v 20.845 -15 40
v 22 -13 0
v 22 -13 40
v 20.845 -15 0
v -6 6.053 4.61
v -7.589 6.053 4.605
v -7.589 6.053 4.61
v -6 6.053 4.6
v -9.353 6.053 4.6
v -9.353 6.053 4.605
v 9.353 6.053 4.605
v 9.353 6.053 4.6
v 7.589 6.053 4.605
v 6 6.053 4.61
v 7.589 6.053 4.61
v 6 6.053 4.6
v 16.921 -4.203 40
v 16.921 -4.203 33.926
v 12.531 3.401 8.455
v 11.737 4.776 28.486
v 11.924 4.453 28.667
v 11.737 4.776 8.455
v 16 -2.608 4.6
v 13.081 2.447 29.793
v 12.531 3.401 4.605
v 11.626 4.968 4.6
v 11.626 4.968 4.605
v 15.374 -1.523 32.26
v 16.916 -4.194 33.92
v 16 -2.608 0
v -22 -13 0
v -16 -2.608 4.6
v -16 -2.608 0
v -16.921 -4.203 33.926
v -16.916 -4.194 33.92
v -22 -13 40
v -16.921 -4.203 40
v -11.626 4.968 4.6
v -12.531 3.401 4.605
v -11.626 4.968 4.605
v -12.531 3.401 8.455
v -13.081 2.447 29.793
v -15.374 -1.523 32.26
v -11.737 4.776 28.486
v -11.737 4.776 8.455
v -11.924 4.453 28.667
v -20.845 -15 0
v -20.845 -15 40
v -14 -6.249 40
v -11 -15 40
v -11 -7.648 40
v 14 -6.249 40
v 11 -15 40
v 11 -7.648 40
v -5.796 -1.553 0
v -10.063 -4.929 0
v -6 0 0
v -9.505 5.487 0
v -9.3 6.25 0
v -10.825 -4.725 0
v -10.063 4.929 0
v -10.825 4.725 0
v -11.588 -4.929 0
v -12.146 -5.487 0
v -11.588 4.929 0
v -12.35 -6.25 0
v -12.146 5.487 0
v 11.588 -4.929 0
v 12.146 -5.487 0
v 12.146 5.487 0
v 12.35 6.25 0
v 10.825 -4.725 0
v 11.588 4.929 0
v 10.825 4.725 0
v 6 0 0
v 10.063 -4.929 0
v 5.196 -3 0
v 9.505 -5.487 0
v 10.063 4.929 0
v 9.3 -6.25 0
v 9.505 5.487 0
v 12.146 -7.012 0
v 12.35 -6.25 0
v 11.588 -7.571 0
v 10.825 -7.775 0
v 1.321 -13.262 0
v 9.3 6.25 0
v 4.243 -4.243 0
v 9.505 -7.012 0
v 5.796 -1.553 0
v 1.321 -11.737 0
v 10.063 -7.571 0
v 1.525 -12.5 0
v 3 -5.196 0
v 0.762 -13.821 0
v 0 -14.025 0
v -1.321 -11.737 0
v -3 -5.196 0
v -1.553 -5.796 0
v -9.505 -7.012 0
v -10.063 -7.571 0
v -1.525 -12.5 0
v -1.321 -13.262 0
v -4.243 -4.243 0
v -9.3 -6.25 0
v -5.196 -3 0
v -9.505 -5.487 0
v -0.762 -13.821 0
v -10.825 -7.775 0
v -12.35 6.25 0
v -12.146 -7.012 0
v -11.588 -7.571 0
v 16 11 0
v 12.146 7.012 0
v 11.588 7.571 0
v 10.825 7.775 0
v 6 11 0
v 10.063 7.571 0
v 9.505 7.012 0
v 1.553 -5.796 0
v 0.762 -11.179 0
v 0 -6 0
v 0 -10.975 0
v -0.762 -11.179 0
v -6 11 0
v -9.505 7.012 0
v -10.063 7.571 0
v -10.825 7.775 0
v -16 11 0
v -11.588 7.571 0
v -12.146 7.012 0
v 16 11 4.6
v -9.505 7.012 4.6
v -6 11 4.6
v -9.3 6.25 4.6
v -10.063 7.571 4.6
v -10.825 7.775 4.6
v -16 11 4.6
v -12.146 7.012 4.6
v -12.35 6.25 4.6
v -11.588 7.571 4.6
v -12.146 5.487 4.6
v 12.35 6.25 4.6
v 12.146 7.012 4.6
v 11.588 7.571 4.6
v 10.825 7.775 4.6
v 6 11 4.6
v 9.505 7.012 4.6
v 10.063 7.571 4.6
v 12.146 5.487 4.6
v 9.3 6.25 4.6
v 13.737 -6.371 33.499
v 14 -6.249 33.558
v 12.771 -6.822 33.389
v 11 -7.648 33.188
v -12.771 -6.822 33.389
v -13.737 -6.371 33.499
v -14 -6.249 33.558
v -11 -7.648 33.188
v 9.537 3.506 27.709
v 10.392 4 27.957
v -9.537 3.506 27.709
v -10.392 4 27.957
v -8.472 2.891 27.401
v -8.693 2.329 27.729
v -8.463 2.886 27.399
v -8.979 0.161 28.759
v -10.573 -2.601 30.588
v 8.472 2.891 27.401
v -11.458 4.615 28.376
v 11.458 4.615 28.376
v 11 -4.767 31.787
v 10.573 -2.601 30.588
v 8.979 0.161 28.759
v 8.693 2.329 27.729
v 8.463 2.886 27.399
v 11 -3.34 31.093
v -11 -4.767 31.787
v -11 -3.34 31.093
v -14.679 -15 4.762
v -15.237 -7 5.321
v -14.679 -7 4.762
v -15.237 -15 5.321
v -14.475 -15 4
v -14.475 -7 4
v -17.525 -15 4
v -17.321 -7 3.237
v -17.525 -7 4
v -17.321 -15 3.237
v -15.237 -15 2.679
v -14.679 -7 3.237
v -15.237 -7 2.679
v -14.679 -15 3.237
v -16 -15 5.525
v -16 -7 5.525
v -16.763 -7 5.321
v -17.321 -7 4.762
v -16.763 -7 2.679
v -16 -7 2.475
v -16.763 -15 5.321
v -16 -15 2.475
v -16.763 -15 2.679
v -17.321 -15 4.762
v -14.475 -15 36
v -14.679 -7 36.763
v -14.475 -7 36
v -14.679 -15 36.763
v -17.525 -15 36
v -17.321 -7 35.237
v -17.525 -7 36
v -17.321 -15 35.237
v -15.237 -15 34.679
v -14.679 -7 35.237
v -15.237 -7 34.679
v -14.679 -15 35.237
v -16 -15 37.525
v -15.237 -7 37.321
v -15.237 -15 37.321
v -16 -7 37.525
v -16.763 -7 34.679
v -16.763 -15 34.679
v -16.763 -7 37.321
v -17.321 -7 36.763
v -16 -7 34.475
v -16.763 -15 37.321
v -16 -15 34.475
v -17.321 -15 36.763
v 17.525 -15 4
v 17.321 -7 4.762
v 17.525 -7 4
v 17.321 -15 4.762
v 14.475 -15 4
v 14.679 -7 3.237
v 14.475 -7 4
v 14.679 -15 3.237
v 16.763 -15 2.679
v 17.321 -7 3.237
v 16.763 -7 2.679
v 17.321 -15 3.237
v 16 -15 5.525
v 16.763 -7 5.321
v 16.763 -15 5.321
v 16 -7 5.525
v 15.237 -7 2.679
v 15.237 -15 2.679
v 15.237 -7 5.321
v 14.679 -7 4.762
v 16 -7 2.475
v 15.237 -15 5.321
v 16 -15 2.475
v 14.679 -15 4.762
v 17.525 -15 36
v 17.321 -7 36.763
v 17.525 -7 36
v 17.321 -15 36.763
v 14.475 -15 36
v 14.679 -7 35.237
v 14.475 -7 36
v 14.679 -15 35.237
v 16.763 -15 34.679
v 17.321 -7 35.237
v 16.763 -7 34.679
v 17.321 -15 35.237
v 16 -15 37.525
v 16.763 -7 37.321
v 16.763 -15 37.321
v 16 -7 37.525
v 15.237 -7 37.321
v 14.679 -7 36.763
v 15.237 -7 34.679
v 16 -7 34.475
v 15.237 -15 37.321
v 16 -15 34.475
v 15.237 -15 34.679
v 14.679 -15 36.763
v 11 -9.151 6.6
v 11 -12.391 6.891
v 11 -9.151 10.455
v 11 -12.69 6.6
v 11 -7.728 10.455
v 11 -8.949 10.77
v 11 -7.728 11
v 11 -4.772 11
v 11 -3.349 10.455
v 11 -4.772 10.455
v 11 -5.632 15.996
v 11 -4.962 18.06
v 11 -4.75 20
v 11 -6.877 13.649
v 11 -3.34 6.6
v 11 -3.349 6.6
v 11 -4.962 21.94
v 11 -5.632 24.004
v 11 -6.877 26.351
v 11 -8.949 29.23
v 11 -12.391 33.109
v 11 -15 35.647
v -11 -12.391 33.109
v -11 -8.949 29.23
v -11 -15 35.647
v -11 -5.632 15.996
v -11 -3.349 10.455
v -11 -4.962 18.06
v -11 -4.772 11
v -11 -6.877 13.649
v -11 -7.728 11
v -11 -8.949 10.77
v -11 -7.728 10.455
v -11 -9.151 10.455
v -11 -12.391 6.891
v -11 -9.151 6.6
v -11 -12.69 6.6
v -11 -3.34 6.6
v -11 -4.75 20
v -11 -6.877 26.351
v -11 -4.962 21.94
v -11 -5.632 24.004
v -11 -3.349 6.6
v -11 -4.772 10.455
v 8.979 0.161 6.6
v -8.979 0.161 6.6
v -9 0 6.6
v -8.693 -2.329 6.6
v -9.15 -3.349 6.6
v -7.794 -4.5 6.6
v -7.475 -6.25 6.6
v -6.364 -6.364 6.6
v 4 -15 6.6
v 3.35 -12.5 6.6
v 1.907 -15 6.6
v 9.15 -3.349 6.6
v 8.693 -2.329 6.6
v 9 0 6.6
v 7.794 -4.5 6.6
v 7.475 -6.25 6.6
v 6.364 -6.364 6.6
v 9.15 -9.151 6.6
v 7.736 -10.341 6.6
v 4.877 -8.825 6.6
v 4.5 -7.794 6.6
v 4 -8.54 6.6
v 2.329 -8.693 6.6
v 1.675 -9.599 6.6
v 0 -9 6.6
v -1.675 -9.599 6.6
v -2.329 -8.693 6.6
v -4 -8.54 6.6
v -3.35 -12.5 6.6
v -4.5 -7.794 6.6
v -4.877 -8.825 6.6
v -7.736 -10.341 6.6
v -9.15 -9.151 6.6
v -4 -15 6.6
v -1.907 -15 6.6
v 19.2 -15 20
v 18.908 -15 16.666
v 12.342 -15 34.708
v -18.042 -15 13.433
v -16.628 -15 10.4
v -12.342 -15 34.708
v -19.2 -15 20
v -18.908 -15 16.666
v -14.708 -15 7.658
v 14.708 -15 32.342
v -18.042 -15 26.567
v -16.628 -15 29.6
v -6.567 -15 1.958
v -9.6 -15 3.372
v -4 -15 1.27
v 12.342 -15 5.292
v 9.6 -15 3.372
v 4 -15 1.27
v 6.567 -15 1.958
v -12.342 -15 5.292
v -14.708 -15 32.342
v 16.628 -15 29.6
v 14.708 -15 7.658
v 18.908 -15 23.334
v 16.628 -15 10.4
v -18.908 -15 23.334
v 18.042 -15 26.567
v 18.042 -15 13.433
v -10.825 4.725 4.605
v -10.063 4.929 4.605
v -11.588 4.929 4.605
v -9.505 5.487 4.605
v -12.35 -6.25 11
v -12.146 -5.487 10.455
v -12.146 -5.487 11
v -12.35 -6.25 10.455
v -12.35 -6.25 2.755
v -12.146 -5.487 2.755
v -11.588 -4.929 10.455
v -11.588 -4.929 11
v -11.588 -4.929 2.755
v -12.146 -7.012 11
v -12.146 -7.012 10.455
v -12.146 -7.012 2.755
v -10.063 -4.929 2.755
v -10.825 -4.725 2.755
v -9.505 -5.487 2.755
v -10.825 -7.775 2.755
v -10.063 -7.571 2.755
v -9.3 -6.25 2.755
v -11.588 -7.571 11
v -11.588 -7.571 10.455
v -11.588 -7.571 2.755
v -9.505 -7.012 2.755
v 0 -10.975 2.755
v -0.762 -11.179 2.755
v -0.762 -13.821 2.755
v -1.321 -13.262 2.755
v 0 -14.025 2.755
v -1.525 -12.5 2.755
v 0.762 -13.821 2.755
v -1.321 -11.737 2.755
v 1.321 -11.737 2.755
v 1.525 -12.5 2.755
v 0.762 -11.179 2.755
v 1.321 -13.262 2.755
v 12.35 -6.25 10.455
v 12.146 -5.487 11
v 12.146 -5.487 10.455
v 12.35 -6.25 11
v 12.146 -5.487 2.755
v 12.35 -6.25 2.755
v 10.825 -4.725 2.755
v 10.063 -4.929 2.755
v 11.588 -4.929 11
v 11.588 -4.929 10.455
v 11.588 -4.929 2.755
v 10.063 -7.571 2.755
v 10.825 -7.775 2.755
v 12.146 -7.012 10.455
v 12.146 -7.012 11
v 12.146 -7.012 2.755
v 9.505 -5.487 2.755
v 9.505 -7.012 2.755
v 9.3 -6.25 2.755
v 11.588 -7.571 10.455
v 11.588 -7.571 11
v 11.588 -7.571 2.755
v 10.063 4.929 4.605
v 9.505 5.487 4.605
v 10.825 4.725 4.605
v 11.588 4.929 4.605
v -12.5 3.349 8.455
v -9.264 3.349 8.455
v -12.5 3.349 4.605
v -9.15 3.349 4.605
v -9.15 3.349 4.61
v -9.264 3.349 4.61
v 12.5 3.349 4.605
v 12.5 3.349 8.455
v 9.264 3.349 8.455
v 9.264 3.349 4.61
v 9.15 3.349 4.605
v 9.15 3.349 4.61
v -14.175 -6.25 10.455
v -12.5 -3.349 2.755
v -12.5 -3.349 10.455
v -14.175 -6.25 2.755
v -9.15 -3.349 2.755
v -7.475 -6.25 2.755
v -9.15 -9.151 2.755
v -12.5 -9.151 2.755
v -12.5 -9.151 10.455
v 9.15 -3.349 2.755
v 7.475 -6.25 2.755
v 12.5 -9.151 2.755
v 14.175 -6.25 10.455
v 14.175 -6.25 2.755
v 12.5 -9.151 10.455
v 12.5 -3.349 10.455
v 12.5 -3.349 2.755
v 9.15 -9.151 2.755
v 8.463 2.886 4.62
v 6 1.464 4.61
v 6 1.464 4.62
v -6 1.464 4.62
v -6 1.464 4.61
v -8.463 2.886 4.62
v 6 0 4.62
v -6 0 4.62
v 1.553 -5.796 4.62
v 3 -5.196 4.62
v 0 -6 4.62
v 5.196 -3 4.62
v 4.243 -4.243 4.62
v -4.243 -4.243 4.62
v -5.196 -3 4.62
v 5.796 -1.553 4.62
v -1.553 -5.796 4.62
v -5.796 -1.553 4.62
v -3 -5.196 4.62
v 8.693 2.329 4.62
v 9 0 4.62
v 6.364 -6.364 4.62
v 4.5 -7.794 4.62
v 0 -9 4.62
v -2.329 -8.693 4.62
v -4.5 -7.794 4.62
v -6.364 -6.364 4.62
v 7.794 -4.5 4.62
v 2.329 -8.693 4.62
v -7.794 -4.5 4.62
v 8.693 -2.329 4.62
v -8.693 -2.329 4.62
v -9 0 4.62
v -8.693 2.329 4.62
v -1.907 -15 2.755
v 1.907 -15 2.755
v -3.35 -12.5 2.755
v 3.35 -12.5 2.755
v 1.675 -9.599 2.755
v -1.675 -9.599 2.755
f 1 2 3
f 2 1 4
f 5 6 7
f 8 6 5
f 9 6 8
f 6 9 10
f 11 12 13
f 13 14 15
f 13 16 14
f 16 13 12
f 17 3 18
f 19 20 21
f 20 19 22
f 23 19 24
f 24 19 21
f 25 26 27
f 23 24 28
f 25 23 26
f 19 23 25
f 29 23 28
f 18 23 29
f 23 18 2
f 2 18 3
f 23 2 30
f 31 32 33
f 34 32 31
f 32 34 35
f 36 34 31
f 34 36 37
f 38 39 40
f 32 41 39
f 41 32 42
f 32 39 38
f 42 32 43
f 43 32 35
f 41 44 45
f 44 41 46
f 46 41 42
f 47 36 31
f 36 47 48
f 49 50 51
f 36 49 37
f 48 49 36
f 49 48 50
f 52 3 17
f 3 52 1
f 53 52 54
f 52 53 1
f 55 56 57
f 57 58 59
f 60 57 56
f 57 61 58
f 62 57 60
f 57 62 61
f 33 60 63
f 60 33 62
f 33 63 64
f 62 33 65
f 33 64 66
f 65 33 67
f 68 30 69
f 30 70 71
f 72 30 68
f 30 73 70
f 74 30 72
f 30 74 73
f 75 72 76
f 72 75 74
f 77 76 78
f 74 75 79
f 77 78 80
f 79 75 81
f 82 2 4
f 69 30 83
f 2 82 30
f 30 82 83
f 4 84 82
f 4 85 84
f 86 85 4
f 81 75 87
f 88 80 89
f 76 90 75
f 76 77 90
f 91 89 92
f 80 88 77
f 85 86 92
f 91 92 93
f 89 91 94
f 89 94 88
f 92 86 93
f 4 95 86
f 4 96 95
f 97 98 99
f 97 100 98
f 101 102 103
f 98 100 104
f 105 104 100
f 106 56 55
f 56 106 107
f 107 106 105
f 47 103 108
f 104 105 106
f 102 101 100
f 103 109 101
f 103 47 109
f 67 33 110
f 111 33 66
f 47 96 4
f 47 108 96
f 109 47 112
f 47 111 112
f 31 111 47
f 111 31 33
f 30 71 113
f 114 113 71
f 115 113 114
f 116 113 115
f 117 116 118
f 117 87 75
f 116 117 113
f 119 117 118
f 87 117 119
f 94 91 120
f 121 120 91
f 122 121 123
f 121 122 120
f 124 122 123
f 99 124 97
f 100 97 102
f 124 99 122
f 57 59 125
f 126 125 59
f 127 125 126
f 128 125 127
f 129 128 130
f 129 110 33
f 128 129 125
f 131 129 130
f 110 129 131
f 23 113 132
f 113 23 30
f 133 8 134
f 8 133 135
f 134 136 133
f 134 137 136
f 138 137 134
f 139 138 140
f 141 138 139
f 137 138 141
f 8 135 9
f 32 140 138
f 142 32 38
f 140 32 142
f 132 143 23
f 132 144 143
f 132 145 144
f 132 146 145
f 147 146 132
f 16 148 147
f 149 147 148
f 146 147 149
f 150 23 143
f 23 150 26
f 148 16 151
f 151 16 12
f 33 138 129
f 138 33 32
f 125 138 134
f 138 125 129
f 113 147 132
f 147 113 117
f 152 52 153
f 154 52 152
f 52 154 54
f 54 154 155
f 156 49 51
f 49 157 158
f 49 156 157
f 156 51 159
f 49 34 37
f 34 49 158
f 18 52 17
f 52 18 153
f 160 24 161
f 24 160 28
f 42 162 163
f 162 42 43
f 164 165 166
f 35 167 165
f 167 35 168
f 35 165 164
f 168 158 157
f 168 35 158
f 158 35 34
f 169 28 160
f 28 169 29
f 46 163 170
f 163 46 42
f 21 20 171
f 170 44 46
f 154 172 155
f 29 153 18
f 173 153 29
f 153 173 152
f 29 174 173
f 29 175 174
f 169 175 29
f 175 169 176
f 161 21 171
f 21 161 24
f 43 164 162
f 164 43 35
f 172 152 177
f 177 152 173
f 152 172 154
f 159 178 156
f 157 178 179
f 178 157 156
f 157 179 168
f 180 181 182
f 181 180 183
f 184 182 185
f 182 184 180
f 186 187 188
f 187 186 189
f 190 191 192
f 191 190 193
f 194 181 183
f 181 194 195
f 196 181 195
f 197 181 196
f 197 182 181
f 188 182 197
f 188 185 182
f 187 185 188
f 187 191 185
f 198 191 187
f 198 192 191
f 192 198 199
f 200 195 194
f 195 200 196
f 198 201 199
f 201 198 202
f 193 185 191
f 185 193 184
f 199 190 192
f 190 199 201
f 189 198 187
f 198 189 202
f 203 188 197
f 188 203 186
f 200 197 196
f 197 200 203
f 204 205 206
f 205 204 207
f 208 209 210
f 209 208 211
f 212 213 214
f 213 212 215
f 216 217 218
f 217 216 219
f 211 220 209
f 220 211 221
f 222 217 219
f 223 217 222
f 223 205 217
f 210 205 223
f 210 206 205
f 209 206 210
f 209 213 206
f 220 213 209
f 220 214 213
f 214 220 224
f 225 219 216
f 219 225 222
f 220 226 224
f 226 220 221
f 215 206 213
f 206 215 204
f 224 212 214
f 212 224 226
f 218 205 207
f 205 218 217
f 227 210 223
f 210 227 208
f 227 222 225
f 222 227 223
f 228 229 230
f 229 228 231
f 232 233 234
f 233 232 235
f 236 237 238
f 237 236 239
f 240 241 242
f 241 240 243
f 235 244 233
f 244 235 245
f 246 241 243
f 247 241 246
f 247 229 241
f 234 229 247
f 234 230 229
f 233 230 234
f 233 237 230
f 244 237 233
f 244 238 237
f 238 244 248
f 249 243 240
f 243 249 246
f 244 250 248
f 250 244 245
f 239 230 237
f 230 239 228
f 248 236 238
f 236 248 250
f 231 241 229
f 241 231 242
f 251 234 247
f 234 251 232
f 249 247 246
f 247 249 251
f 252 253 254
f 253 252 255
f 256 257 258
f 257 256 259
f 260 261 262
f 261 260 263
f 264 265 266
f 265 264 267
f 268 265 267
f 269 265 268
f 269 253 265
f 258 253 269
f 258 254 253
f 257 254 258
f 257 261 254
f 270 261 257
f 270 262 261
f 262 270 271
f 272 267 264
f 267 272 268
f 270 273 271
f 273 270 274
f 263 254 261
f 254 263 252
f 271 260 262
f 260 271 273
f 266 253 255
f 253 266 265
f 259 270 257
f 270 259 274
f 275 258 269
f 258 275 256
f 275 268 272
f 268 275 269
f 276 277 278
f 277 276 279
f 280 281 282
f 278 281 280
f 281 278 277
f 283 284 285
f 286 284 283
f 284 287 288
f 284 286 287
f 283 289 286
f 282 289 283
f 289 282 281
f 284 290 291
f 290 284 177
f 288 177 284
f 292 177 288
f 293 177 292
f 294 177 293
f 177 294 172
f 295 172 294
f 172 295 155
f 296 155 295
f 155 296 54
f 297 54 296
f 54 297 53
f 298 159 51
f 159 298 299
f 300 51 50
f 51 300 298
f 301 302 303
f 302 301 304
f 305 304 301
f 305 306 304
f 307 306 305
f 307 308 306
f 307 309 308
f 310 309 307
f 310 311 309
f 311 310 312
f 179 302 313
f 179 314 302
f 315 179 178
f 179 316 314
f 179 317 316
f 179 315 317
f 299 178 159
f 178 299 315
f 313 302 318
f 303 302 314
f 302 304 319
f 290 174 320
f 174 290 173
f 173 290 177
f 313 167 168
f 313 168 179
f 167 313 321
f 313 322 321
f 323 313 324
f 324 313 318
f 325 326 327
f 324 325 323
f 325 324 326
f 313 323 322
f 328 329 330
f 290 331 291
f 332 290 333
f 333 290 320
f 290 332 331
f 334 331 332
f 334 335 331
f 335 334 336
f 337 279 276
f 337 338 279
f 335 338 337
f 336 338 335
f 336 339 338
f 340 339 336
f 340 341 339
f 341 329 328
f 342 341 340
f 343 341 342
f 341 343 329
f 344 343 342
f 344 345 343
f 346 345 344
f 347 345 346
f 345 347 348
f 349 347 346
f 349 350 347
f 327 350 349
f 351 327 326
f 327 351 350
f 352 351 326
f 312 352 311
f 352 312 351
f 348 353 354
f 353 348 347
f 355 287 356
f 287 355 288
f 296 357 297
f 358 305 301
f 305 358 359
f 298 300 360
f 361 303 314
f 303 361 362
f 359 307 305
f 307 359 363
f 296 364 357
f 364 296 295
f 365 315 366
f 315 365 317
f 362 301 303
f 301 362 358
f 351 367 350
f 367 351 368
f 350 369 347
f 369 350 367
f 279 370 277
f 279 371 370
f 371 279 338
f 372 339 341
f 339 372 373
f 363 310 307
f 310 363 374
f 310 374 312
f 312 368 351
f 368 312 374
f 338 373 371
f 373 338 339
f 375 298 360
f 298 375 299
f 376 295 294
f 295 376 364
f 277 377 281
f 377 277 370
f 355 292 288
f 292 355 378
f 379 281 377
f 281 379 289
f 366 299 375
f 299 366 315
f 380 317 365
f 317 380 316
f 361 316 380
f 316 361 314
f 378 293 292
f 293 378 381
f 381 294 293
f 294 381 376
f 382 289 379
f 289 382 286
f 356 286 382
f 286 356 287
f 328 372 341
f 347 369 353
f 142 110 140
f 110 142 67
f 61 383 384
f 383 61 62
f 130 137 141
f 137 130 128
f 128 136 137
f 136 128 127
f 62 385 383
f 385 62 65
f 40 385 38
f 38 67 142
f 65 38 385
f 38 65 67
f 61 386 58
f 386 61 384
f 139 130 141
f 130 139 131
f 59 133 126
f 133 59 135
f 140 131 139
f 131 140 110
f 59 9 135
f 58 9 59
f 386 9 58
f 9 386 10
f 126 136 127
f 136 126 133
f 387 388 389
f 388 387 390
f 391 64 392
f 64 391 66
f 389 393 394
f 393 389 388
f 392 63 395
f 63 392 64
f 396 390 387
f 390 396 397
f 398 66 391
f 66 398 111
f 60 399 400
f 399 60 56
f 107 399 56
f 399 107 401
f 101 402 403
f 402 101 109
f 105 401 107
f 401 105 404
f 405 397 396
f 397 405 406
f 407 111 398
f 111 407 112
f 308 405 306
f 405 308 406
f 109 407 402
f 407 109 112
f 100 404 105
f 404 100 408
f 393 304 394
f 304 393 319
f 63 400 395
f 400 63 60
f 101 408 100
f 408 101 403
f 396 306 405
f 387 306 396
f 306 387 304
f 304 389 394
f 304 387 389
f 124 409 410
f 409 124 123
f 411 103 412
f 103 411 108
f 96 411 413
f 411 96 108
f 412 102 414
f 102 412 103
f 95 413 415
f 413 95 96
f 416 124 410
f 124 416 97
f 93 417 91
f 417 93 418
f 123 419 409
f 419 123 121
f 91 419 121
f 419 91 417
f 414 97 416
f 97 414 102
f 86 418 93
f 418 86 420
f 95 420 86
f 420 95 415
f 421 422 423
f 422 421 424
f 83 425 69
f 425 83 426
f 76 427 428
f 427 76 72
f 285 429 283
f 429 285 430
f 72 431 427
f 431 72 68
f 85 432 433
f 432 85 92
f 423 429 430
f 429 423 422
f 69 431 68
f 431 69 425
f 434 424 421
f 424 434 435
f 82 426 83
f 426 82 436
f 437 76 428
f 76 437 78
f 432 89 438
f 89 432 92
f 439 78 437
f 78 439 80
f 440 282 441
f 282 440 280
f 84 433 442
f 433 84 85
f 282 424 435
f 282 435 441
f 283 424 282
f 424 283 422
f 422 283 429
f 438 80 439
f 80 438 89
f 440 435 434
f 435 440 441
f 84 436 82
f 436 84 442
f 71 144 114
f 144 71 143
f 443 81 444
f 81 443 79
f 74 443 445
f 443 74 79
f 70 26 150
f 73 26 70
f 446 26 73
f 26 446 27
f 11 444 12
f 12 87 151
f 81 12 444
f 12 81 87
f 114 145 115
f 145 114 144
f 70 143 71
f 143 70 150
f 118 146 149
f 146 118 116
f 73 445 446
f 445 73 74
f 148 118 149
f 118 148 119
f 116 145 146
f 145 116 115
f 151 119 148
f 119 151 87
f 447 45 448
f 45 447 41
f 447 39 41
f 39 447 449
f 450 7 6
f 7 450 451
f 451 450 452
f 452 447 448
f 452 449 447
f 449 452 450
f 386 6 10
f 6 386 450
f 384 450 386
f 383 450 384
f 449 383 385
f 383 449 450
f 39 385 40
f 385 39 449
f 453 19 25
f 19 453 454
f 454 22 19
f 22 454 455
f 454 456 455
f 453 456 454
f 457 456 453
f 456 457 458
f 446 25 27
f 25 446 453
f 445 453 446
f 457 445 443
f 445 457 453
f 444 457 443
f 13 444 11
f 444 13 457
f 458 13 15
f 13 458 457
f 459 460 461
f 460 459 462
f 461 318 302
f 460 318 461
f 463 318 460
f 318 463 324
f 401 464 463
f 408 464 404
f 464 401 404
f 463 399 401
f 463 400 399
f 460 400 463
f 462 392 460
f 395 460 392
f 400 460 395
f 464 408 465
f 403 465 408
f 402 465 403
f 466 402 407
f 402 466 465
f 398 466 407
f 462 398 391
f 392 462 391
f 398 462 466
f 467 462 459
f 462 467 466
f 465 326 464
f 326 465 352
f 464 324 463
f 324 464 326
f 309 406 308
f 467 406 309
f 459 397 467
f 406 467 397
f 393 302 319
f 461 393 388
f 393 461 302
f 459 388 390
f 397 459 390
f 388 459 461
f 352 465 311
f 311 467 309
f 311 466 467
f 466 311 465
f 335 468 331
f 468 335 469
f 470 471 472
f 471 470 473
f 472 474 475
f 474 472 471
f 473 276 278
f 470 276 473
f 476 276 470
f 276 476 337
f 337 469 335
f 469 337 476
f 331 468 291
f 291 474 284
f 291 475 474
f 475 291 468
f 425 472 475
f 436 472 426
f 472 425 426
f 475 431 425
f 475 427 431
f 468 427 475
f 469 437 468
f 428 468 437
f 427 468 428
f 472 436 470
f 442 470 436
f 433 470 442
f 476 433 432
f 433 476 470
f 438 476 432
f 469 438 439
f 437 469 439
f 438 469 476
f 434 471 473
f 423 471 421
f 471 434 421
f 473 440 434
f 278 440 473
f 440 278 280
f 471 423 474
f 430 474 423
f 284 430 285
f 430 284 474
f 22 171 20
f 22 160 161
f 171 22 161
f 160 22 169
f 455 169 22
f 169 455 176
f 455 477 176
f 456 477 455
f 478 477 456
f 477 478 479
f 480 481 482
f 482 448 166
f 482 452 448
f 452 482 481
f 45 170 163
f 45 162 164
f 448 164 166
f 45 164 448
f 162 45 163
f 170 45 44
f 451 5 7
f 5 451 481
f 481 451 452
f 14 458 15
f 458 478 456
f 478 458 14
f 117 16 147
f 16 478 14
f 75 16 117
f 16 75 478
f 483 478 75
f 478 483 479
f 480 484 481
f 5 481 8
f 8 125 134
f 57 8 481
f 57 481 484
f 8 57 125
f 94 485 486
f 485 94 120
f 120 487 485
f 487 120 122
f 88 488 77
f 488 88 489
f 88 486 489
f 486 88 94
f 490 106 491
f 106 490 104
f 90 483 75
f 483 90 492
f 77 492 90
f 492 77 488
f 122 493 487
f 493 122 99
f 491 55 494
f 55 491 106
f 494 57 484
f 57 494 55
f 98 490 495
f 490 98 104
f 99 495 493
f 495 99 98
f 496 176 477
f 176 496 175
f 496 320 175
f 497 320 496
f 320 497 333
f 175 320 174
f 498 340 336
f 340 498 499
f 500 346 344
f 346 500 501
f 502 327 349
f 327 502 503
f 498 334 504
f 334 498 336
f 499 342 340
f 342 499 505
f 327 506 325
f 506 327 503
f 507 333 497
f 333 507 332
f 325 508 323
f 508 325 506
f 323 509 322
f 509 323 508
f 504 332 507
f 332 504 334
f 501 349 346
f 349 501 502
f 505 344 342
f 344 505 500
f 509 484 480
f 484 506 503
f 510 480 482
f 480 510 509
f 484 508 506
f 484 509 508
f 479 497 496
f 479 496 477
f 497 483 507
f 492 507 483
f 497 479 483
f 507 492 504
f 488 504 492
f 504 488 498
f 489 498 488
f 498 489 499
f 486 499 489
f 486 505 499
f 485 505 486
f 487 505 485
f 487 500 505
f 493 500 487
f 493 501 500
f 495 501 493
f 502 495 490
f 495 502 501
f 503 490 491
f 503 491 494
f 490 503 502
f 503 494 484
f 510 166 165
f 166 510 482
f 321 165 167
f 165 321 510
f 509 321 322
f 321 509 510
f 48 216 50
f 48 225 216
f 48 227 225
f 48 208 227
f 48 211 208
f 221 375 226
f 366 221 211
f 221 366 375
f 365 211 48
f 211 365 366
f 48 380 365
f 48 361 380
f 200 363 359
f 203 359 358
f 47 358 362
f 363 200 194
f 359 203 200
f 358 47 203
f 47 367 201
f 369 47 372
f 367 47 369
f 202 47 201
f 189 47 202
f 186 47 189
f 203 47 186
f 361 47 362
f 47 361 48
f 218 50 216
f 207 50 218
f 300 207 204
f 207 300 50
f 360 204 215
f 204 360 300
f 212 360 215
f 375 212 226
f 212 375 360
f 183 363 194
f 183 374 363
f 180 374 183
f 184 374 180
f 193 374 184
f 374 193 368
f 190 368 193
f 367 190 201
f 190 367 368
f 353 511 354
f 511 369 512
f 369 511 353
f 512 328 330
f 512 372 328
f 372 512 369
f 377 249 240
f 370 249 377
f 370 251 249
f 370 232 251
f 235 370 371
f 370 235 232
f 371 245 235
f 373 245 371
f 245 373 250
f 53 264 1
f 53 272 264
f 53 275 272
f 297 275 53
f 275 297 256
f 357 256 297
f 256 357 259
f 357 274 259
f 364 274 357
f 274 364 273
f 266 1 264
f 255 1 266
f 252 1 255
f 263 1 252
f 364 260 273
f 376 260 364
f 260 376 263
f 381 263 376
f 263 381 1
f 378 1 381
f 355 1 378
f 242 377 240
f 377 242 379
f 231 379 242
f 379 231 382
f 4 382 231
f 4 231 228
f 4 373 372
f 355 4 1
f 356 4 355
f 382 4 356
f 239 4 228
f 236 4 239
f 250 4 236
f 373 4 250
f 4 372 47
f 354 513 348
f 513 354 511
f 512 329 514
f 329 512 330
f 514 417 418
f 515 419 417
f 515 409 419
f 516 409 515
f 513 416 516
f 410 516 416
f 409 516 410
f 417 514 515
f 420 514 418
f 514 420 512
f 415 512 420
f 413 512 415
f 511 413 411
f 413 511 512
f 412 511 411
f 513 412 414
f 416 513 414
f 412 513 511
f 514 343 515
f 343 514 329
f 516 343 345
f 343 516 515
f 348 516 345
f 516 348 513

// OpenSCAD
// file: configuration.scad
// Increase this if your slicer or printer make holes too tight.
extra_radius = 0.1;

// OD = outside diameter, corner to corner.
m3_nut_od = 6.1;
m3_nut_radius = m3_nut_od/2 + 0.2 + extra_radius;
m3_washer_radius = 3.5 + extra_radius;
m3_nut_thickness = 2.35;
m3_nyloc_thickness = 3.85;

// Major diameter of metric 3mm thread.
m3_major = 2.85;
m3_radius = m3_major/2 + extra_radius;
m3_wide_radius = m3_major/2 + extra_radius + 0.2;

// NEMA17 stepper motors.
motor_shaft_diameter = 5;
motor_shaft_radius = motor_shaft_diameter/2 + extra_radius;

// Frame brackets. M3x8mm screws work best with 3.6 mm brackets.
thickness = 3.6;

// OpenBeam or Misumi. Currently only 15x15 mm, but there is a plan
// to make models more parametric and allow 20x20 mm in the future.
extrusion = 15;

// Placement for the NEMA17 stepper motors.
motor_offset = 44;
motor_length = 47;
// main file
include <configuration.scad>;

barrel_radius = 8;
barrel_height = 30;

groove_radius = 6;
groove_height = 4.6;

fan_offset = 15;

module hotend_fan() {
  difference() {
    union() {
      translate([0, 2 - fan_offset, 0])
        cylinder(r=22, h=40, $fn=6);
      translate([0, 0, groove_height/2])
        cube([32, 22, groove_height], center=true);
    }
    // Opposite side cutaway (outgoing airflow).
    translate([0, 38, groove_height + 0.01]) rotate([0, 0, 30])
      cylinder(r=40, h=200, $fn=6);
    // Groove mount insert slot.
    translate([0, 10, 0])
      cube([2*groove_radius, 20, 20], center=true);
    // Keep printed plastic away from the hotend.
    intersection() {
      translate([0, 18, 0]) rotate([0, 0, 30])
        cylinder(r=28, h=100, center=true, $fn=36);
      translate([0, 10, barrel_height-5])
        cylinder(r1=barrel_radius-1, r2=100, h=55, $fn=36);
    }
    // Groove mount.
    cylinder(r=groove_radius, h=200, center=true, $fn=24);
    // J-Head barrel.
    translate([0, 0, groove_height + 0.02])
      cylinder(r=barrel_radius + 1, h=100, $fn=24);
    // Fan mounting surface and screws.
    translate([0, -50 - fan_offset, 0])
      cube([100, 100, 100], center=true);
    for (x = [-16, 16]) {
      for (z = [-16, 16]) {
        translate([x, -fan_offset, z+20]) rotate([90, 0, 0]) #
          cylinder(r=m3_radius, h=16, center=true, $fn=12);
      }
    }
    // Vertical inner space.
    intersection() {
      cube([22, 100, 100], center=true);
      translate([0, -12, groove_height + 2])
        cylinder(r=16, h=40, $fn=6);
    }
    // Air funnel.
    difference() {
      translate([0, -1 - fan_offset, 20]) rotate([-90, 0, 0])
        cylinder(r1=20, r2=0, h=25, $fn=36);
      cube([8, 40, 40], center=true);
    }
    for (a = [60:60:359]) {
      rotate([0, 0, a]) translate([0, 12.5, 5]) { #
        cylinder(r=m3_radius, h=12, center=true, $fn=12);
      }
    }
    for (a = [60, 300]) {
      rotate([0, 0, a]) translate([0, 12.5, 6.53])
        # cylinder(r=m3_nut_radius, h=m3_nyloc_thickness, center = true, $fn=6);
    }
    for (a = [120, 240]) {
      rotate([0, 0, a]) translate([0, 12.5, 8.53-m3_nyloc_thickness/2])
        # cylinder(r=m3_nut_radius, h=m3_nyloc_thickness*2, center = true, $fn=6);
    }
    rotate([0, 0, 180]) translate([0, 12.5, 4.68])
      # cylinder(r=m3_nut_radius, h=m3_nyloc_thickness, center = true, $fn=6);
  }
}

hotend_fan();

// Hotend barrel.
translate([0, 0, groove_height]) %
  cylinder(r=barrel_radius, h=barrel_height);

// 40mm fan.
translate([0, -5 - fan_offset, 20]) % difference() {
  cube([40, 10, 40], center=true);
  rotate([90, 0, 0,]) cylinder(r=19, h=20, center=true);
}
